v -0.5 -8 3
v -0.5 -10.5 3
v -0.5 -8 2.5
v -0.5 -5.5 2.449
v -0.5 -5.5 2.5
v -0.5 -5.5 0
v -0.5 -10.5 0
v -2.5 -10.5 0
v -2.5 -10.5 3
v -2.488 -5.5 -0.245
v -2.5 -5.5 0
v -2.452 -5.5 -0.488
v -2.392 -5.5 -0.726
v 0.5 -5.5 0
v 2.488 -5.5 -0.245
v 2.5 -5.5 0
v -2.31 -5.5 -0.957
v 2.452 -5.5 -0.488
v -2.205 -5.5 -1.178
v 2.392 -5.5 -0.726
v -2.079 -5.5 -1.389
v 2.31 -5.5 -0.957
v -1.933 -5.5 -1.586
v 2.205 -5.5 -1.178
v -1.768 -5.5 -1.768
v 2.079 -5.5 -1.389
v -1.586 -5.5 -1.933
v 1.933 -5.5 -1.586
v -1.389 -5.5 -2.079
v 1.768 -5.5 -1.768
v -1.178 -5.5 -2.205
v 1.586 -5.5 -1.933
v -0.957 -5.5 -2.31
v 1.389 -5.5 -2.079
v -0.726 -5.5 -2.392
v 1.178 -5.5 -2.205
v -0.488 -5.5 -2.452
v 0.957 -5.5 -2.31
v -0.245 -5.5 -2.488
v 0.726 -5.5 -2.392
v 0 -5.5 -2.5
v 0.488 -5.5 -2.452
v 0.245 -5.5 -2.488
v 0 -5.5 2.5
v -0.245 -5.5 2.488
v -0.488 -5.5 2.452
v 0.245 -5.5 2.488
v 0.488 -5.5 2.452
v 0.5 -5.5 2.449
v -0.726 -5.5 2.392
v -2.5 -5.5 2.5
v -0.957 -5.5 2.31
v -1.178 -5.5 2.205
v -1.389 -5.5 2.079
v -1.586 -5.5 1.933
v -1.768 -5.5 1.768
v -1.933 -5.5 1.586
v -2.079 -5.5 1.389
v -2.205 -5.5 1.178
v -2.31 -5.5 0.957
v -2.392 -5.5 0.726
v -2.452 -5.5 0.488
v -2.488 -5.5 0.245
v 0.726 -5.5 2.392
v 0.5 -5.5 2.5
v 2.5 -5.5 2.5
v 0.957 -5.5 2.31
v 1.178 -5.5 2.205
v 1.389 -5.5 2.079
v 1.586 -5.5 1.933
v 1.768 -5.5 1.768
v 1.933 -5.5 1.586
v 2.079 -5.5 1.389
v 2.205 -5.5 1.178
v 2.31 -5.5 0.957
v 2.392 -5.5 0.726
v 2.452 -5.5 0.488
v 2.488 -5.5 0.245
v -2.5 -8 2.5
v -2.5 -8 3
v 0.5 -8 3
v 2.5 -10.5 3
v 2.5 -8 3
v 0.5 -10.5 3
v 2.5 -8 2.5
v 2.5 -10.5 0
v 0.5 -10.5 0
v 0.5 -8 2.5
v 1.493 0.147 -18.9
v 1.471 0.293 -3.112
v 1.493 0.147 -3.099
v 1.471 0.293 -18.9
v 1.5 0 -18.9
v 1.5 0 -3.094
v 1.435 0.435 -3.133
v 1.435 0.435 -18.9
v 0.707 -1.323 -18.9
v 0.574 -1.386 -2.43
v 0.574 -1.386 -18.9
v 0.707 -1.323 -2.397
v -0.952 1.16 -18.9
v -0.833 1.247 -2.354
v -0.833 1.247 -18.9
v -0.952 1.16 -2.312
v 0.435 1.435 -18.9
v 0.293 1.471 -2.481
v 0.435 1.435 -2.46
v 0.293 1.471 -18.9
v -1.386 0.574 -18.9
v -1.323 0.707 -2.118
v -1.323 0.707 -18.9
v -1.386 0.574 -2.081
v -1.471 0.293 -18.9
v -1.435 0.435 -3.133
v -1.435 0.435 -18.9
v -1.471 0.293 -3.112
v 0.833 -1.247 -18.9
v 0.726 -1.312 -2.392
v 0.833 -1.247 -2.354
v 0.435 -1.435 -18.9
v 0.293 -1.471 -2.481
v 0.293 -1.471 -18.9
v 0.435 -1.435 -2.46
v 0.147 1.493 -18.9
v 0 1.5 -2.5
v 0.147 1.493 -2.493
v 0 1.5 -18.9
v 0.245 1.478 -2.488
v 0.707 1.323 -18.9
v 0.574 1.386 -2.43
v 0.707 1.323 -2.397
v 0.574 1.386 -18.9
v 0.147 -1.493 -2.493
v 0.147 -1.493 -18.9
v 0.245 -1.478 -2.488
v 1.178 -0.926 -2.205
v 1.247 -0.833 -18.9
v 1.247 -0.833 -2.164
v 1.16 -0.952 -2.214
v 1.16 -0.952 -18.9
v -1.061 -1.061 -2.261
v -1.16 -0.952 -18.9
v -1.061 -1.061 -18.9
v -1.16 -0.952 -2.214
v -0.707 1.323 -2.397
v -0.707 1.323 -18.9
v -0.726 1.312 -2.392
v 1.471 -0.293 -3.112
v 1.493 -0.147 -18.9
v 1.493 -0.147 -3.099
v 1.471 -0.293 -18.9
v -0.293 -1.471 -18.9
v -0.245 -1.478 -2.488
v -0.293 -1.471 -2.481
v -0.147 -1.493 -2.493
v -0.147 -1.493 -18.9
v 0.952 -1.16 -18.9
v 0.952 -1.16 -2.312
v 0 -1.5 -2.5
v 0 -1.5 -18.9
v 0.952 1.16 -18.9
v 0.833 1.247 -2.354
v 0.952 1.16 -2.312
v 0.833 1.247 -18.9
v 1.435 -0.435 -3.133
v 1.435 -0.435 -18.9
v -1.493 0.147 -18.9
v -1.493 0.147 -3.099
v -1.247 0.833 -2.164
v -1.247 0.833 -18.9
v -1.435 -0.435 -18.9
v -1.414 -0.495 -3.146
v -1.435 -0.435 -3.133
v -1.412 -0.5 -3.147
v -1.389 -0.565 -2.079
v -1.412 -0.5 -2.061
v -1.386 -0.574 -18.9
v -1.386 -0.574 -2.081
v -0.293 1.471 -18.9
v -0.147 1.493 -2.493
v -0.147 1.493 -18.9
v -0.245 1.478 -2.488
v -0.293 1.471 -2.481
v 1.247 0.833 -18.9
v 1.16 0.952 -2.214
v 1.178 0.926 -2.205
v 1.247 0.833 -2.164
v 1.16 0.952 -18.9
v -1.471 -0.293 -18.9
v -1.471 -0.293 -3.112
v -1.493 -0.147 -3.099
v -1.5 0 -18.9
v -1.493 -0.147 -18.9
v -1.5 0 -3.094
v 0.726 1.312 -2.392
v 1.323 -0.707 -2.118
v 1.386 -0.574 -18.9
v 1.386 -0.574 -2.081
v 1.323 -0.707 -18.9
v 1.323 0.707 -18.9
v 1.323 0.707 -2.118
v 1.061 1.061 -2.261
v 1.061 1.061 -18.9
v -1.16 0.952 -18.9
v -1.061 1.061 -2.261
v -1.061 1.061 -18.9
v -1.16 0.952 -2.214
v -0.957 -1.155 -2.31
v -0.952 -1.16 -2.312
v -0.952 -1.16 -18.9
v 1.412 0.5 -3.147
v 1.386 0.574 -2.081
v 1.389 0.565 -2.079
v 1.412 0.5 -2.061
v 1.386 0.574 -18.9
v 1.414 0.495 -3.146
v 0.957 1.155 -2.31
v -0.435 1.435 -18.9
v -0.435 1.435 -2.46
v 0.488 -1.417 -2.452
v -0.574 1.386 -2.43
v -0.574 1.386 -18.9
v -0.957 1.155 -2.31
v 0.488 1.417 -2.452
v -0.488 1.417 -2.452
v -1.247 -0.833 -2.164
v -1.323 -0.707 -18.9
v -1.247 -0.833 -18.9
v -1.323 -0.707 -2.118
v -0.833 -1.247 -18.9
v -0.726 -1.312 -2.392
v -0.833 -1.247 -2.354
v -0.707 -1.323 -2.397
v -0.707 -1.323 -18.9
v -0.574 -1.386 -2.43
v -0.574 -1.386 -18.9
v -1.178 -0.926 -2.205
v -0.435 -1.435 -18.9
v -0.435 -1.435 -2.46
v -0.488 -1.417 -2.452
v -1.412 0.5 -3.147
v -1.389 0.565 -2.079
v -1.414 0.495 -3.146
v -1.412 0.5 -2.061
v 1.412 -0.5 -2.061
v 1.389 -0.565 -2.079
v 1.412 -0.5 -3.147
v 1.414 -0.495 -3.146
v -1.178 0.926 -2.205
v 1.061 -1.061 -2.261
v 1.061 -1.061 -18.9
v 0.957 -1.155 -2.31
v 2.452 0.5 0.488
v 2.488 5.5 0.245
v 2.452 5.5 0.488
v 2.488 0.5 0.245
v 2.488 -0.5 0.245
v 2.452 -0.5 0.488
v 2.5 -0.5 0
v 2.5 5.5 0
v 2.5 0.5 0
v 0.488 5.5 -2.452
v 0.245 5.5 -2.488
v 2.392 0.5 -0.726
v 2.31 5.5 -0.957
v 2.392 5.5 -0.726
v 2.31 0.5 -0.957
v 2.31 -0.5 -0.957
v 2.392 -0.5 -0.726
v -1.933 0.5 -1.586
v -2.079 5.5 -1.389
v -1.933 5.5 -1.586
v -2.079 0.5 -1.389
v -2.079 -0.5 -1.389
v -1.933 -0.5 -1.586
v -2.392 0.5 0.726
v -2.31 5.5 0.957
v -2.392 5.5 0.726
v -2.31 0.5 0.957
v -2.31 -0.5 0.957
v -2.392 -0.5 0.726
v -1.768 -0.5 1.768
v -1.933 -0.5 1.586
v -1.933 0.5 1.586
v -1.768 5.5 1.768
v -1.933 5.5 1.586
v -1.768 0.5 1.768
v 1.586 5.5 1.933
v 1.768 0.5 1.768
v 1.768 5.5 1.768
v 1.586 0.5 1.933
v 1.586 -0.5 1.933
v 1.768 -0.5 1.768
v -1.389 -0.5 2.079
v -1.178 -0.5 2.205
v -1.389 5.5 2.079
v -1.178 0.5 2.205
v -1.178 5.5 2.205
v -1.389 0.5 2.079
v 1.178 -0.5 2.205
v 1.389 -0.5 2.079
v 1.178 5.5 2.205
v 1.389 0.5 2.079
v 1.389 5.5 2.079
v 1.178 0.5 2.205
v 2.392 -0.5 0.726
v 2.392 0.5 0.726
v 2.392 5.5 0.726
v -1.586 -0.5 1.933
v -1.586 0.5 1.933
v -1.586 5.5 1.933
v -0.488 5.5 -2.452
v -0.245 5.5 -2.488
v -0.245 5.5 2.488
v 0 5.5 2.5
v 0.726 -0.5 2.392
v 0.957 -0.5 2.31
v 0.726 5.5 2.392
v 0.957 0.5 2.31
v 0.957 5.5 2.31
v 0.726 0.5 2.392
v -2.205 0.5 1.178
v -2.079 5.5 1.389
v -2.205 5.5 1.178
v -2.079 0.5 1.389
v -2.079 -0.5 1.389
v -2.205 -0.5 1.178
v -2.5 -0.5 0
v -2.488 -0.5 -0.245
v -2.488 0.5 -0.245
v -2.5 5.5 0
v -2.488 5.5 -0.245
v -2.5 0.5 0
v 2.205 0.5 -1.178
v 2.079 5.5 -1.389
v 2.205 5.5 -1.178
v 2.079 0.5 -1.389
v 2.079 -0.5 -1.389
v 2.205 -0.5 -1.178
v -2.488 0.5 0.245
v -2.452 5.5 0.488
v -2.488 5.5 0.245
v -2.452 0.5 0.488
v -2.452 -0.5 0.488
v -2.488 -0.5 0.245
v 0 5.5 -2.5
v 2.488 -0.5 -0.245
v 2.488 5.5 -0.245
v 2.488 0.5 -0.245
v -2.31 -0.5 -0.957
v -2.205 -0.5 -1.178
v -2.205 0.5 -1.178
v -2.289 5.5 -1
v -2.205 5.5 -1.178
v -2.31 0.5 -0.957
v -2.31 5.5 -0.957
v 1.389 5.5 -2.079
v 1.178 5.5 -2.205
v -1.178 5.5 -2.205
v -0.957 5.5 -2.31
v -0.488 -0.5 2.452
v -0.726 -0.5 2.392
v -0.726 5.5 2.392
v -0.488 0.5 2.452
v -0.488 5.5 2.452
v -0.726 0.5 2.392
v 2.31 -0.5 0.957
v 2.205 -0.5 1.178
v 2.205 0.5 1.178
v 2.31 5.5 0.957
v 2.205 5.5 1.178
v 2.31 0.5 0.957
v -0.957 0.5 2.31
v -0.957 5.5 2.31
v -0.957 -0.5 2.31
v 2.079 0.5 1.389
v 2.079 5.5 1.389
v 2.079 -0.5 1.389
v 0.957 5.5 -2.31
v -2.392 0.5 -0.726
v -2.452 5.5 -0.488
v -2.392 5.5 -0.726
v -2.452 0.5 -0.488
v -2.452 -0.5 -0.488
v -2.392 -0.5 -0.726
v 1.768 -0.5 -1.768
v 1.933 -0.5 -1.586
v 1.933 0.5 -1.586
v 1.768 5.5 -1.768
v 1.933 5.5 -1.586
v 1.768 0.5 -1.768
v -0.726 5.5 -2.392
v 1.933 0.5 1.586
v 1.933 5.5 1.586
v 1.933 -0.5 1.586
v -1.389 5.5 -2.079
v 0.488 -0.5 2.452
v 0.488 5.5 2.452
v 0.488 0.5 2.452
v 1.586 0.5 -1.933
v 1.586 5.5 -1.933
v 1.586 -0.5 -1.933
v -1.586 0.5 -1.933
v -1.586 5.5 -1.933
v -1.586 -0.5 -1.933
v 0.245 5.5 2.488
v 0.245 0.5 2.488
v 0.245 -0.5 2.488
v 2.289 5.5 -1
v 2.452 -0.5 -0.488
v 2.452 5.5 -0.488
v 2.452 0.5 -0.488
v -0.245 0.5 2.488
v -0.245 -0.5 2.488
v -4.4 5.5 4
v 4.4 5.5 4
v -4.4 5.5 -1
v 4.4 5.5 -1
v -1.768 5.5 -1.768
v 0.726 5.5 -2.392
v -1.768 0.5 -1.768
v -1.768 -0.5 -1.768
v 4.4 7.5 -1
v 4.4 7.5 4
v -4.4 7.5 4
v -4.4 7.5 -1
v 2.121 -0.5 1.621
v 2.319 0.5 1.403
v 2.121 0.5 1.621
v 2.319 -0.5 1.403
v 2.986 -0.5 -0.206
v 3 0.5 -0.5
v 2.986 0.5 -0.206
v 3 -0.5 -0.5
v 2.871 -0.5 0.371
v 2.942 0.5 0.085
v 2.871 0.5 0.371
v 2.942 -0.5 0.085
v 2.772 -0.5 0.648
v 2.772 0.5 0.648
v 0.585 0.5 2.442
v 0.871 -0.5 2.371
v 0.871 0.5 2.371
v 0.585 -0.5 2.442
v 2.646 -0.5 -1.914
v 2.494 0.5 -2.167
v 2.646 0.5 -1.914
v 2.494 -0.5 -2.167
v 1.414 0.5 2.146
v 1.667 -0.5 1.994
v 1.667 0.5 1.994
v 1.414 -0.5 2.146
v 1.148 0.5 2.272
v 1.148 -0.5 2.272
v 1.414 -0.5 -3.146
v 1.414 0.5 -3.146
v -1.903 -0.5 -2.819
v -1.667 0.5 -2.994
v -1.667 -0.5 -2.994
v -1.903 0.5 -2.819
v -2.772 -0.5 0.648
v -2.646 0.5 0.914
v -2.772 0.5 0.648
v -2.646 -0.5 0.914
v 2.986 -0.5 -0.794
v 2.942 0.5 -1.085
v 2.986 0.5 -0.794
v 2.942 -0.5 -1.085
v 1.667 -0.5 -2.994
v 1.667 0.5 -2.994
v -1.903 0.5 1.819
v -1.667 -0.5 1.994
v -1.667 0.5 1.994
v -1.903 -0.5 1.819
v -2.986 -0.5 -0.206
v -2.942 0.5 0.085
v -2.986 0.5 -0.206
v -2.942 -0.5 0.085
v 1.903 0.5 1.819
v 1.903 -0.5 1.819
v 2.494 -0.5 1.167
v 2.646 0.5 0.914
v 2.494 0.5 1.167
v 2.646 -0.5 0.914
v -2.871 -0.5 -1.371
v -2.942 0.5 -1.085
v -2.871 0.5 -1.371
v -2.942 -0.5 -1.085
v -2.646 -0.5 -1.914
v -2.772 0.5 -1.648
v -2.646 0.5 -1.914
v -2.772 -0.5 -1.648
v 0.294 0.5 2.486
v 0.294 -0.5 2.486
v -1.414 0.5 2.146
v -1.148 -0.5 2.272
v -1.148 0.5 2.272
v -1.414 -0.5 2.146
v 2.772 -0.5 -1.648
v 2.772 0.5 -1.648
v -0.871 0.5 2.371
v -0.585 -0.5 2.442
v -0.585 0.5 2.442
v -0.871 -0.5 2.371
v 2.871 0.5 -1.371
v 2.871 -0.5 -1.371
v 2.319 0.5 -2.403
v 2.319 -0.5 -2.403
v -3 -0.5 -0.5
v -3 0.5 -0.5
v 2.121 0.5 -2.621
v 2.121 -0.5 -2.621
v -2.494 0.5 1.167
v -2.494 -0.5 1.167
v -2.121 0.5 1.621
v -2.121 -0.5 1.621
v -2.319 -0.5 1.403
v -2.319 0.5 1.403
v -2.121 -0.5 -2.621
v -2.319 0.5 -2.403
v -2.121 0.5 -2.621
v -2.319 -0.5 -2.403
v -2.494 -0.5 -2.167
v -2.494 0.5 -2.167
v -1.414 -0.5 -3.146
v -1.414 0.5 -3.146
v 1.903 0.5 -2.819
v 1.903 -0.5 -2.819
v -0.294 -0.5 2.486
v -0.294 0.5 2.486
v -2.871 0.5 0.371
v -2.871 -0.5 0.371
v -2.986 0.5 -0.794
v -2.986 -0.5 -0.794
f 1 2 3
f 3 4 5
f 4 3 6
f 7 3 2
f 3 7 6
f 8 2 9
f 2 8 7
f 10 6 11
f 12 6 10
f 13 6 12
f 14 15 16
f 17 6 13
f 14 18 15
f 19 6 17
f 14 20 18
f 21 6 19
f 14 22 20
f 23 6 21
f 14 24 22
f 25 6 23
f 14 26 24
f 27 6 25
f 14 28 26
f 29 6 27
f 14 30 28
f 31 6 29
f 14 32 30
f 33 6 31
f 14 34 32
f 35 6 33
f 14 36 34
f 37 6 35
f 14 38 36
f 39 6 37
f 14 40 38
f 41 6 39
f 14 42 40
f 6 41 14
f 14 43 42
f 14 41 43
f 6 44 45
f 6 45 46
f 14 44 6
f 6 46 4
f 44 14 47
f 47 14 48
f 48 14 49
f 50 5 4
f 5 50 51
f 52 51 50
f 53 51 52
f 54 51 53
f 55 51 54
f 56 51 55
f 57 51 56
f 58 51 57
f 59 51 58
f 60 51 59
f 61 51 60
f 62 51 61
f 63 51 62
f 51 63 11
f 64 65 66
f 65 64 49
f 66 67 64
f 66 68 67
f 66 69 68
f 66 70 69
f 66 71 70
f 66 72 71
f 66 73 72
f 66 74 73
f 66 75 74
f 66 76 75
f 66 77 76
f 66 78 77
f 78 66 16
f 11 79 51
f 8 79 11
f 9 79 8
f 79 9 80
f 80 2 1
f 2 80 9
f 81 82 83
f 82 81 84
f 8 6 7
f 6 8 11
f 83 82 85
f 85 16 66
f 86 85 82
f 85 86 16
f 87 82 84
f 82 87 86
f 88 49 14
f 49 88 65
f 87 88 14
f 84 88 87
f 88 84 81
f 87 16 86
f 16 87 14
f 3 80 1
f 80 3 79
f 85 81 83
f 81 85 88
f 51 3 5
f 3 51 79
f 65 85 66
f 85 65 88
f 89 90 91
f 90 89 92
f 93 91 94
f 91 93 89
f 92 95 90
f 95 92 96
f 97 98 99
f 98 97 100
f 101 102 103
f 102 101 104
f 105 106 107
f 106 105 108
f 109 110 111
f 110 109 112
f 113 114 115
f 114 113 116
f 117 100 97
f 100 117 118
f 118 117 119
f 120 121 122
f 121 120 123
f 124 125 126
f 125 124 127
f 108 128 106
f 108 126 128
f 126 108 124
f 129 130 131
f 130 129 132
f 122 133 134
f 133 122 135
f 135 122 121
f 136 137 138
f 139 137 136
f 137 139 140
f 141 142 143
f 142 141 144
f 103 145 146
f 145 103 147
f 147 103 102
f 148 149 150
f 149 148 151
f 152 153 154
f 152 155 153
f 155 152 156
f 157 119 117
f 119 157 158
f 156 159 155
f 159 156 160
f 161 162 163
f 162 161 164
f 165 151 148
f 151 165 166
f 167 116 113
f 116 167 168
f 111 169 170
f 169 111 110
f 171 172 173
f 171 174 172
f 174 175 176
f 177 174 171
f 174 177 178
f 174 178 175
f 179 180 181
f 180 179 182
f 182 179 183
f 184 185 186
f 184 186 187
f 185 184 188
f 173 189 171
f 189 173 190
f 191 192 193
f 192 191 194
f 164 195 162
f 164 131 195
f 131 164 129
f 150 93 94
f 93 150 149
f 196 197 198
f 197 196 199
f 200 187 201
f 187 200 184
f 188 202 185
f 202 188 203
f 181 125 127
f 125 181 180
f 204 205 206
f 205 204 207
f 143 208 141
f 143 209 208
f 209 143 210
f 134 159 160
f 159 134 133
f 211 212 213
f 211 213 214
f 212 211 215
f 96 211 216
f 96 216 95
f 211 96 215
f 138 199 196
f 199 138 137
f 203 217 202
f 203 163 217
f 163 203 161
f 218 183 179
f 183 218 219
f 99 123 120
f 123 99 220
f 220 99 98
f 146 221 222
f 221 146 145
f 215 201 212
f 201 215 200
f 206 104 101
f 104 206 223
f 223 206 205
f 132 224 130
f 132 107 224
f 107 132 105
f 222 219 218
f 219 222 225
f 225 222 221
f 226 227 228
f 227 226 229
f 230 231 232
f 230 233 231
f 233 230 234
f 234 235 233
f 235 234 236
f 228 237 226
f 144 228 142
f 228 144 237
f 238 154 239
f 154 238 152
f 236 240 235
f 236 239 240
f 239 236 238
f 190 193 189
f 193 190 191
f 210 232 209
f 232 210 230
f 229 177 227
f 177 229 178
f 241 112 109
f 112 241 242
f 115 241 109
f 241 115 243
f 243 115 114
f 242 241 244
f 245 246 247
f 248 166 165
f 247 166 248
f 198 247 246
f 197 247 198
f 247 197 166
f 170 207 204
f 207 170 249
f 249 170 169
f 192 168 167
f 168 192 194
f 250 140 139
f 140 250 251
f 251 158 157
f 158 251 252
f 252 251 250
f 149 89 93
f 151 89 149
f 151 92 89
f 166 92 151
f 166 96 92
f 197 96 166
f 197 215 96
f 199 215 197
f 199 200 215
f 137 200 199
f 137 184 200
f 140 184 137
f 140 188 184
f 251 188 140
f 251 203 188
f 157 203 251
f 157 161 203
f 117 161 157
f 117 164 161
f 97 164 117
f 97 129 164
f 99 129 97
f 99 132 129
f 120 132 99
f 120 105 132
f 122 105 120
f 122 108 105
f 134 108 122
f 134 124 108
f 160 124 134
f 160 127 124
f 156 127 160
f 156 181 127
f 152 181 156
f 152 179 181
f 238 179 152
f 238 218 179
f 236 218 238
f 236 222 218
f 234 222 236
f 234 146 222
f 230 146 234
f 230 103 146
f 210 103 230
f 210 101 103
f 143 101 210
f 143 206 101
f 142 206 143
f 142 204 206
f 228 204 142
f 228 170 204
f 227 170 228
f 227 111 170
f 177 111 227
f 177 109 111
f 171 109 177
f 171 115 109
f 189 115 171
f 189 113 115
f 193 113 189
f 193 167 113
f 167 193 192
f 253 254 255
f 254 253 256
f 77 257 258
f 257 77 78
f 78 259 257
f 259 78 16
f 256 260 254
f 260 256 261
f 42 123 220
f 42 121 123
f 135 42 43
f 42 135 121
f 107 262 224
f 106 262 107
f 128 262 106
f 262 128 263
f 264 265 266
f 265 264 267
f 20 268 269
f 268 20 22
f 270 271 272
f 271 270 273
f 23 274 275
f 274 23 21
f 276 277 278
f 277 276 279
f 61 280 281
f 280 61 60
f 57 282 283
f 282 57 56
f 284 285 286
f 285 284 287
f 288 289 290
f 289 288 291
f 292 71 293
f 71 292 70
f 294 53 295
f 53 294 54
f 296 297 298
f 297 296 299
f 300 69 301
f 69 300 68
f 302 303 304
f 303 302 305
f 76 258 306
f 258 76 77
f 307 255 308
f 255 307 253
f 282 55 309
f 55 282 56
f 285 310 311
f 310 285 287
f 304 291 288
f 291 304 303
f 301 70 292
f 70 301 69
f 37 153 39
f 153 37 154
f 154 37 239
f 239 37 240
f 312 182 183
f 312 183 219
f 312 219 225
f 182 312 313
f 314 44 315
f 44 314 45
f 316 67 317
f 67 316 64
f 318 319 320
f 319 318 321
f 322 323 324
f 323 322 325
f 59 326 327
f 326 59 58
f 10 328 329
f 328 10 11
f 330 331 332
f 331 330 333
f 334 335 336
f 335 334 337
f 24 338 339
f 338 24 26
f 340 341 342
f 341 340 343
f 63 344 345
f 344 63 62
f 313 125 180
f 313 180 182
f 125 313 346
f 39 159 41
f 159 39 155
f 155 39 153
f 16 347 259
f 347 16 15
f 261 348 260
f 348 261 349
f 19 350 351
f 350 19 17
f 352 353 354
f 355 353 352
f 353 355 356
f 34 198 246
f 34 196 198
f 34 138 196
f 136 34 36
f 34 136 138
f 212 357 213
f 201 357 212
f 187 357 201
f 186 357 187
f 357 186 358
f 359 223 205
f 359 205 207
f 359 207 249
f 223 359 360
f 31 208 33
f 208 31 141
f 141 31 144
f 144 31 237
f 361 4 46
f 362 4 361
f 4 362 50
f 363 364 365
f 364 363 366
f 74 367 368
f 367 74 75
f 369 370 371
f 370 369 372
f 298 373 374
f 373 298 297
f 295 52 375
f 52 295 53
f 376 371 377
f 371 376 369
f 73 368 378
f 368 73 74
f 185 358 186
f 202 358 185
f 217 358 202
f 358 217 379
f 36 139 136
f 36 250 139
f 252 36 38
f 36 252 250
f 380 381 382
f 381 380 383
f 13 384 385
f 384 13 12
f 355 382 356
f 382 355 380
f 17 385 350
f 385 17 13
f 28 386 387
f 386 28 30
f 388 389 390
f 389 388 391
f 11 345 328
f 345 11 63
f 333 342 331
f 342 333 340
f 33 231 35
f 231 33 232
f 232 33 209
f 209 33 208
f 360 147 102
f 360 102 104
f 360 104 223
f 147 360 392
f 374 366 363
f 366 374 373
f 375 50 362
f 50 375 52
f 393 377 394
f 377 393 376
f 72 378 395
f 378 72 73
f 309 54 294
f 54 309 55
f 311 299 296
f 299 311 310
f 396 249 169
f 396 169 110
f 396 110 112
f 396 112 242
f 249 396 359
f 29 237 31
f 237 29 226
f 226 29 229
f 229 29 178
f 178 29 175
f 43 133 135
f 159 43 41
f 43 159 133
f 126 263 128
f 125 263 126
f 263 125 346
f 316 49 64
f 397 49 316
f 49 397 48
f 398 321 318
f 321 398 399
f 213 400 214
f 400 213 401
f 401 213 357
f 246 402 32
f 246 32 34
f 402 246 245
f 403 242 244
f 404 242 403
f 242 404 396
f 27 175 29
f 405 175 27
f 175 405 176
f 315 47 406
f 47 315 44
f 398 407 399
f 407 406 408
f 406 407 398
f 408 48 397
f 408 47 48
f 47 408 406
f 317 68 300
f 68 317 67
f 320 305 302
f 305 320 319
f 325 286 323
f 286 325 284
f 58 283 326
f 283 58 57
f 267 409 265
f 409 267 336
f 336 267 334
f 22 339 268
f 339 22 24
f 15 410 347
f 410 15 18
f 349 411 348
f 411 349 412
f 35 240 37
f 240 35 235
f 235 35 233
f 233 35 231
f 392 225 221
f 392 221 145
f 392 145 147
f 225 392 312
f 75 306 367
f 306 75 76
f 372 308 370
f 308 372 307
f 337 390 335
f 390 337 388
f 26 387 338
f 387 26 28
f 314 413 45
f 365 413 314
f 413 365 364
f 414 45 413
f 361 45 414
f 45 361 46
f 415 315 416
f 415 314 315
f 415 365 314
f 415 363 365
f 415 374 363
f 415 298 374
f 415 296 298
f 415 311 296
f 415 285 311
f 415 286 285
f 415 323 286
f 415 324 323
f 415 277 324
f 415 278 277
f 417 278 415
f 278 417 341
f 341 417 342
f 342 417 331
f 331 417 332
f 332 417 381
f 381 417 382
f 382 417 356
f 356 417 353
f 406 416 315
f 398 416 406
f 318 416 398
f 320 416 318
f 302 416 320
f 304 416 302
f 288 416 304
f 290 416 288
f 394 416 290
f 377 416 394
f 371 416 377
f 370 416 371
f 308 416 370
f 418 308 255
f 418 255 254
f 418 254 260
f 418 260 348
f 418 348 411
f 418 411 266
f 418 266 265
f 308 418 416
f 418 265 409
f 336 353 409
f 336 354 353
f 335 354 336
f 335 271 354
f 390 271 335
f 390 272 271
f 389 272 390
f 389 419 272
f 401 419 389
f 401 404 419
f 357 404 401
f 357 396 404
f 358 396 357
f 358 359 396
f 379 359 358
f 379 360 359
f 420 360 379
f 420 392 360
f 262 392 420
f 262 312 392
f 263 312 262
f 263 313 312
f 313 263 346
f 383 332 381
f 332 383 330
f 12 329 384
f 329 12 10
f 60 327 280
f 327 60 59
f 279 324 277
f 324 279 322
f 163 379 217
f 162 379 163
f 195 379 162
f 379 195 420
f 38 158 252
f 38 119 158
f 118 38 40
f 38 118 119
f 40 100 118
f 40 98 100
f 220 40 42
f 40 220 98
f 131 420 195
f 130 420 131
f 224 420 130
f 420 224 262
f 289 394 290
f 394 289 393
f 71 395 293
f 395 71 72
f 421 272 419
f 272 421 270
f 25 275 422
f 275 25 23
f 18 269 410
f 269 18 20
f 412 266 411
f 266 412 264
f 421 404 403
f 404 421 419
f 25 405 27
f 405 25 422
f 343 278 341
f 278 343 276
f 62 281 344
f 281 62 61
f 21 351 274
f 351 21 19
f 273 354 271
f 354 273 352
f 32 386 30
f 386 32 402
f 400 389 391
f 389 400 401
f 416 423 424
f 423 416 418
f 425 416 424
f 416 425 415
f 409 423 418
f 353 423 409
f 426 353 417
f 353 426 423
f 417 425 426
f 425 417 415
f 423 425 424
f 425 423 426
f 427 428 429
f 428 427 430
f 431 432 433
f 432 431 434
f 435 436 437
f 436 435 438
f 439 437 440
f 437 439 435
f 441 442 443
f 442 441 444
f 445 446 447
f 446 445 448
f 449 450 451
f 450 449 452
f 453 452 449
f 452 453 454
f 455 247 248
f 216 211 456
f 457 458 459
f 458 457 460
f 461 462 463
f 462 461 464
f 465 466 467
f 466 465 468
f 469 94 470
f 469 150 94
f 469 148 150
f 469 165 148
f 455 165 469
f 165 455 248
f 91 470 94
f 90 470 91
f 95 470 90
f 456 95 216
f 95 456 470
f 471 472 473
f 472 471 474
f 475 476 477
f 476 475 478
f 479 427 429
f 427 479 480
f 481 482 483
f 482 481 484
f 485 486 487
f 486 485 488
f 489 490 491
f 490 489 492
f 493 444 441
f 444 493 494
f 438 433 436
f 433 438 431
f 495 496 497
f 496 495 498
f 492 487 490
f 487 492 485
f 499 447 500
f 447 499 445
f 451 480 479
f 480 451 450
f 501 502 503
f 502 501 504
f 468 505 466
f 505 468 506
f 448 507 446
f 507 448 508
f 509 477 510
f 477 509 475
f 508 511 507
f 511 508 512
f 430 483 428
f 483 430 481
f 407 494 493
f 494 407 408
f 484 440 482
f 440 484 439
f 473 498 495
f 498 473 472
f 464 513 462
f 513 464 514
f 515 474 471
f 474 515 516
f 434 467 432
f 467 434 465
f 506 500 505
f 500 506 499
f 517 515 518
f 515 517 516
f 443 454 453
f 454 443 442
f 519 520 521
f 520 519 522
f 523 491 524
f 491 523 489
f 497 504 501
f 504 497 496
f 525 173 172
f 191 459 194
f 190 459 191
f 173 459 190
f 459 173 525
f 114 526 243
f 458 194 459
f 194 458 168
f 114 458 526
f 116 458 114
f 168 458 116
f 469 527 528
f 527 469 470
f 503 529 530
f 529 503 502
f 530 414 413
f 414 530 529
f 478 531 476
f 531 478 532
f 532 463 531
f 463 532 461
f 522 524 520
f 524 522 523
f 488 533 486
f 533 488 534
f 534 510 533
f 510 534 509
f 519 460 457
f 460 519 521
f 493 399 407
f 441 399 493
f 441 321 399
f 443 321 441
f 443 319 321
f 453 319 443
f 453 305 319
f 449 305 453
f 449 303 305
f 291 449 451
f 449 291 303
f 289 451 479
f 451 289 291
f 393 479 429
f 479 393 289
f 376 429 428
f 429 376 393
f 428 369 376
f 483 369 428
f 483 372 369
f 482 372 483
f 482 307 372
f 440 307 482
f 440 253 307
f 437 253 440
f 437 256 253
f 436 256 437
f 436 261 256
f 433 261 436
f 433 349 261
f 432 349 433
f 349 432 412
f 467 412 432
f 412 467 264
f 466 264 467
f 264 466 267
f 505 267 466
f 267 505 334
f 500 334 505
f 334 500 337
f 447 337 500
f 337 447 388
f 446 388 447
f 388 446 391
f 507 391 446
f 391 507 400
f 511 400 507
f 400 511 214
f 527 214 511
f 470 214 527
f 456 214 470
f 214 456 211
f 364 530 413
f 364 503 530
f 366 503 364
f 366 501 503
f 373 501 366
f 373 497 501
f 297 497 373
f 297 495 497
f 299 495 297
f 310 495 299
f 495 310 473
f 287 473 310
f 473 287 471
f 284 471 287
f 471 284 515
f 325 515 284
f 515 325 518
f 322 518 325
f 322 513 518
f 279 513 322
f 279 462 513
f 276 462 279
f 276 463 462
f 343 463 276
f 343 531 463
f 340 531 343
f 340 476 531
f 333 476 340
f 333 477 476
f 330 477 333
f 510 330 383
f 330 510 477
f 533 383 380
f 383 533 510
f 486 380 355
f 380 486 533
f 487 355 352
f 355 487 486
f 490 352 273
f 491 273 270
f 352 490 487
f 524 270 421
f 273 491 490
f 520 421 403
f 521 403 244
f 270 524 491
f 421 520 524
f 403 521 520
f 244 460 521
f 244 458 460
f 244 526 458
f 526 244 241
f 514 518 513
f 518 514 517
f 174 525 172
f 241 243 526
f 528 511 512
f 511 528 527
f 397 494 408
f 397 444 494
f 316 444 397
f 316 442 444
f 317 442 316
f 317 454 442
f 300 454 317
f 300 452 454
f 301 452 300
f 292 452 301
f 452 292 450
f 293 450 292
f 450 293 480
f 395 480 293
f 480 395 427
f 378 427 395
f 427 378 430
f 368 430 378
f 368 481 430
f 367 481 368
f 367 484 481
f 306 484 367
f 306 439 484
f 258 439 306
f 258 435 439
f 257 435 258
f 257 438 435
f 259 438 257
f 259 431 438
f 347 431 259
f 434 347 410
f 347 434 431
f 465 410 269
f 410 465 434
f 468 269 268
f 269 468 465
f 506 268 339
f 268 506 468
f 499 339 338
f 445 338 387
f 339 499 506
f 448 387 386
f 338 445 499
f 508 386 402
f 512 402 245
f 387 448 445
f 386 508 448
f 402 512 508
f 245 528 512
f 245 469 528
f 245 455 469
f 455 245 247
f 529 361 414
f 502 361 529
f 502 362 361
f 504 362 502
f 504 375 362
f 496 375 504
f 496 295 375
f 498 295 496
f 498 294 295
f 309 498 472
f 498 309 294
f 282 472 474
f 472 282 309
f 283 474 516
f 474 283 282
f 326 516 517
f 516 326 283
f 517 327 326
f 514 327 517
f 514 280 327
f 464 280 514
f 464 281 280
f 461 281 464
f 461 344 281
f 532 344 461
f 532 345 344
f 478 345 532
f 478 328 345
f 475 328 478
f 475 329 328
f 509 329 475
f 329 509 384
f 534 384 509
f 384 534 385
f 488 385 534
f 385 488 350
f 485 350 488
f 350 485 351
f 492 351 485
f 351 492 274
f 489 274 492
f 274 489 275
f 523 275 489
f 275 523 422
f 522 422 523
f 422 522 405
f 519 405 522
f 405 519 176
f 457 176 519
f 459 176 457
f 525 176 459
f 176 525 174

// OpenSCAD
module t_shaped_fitting() {
    // Parameters
    stem_diameter = 3.0;
    stem_length = 18.9;
    barrel_diameter = 5.0;
    barrel_length = 11.0;
    flange_width = 8.8;
    flange_height = 2.0;
    prong_width = 2.0;
    prong_gap = 1.0;
    prong_length = 3.0;
    collar_diameter = 6.0;
    collar_height = 1.0;
    chamfer_size = 0.5;
    $fn = 64;

    // Stem
    translate([0, 0, -stem_length / 2])
    cylinder(h = stem_length, d = stem_diameter, center = true);

    // Barrel
    translate([0, 0, 0])
    rotate([90, 0, 0])
    cylinder(h = barrel_length, d = barrel_diameter, center = true);

    // Flange
    translate([-flange_width / 2, barrel_length / 2, -flange_height / 2])
    cube([flange_width, flange_height, barrel_diameter]);

    // Prongs
    translate([0, -barrel_length / 2, 0])
    rotate([90, 0, 0])
    difference() {
        union() {
            translate([-prong_width - prong_gap / 2, 0, 0])
            cube([prong_width, prong_length, barrel_diameter]);
            translate([prong_gap / 2, 0, 0])
            cube([prong_width, prong_length, barrel_diameter]);
        }
        translate([-barrel_diameter / 2, prong_length - chamfer_size, -barrel_diameter / 2])
        cube([barrel_diameter, chamfer_size, barrel_diameter]);
    }

    // Collar
    translate([0, 0, -collar_height / 2])
    rotate([90, 0, 0])
    cylinder(h = collar_height, d = collar_diameter, center = true);
}

t_shaped_fitting();
